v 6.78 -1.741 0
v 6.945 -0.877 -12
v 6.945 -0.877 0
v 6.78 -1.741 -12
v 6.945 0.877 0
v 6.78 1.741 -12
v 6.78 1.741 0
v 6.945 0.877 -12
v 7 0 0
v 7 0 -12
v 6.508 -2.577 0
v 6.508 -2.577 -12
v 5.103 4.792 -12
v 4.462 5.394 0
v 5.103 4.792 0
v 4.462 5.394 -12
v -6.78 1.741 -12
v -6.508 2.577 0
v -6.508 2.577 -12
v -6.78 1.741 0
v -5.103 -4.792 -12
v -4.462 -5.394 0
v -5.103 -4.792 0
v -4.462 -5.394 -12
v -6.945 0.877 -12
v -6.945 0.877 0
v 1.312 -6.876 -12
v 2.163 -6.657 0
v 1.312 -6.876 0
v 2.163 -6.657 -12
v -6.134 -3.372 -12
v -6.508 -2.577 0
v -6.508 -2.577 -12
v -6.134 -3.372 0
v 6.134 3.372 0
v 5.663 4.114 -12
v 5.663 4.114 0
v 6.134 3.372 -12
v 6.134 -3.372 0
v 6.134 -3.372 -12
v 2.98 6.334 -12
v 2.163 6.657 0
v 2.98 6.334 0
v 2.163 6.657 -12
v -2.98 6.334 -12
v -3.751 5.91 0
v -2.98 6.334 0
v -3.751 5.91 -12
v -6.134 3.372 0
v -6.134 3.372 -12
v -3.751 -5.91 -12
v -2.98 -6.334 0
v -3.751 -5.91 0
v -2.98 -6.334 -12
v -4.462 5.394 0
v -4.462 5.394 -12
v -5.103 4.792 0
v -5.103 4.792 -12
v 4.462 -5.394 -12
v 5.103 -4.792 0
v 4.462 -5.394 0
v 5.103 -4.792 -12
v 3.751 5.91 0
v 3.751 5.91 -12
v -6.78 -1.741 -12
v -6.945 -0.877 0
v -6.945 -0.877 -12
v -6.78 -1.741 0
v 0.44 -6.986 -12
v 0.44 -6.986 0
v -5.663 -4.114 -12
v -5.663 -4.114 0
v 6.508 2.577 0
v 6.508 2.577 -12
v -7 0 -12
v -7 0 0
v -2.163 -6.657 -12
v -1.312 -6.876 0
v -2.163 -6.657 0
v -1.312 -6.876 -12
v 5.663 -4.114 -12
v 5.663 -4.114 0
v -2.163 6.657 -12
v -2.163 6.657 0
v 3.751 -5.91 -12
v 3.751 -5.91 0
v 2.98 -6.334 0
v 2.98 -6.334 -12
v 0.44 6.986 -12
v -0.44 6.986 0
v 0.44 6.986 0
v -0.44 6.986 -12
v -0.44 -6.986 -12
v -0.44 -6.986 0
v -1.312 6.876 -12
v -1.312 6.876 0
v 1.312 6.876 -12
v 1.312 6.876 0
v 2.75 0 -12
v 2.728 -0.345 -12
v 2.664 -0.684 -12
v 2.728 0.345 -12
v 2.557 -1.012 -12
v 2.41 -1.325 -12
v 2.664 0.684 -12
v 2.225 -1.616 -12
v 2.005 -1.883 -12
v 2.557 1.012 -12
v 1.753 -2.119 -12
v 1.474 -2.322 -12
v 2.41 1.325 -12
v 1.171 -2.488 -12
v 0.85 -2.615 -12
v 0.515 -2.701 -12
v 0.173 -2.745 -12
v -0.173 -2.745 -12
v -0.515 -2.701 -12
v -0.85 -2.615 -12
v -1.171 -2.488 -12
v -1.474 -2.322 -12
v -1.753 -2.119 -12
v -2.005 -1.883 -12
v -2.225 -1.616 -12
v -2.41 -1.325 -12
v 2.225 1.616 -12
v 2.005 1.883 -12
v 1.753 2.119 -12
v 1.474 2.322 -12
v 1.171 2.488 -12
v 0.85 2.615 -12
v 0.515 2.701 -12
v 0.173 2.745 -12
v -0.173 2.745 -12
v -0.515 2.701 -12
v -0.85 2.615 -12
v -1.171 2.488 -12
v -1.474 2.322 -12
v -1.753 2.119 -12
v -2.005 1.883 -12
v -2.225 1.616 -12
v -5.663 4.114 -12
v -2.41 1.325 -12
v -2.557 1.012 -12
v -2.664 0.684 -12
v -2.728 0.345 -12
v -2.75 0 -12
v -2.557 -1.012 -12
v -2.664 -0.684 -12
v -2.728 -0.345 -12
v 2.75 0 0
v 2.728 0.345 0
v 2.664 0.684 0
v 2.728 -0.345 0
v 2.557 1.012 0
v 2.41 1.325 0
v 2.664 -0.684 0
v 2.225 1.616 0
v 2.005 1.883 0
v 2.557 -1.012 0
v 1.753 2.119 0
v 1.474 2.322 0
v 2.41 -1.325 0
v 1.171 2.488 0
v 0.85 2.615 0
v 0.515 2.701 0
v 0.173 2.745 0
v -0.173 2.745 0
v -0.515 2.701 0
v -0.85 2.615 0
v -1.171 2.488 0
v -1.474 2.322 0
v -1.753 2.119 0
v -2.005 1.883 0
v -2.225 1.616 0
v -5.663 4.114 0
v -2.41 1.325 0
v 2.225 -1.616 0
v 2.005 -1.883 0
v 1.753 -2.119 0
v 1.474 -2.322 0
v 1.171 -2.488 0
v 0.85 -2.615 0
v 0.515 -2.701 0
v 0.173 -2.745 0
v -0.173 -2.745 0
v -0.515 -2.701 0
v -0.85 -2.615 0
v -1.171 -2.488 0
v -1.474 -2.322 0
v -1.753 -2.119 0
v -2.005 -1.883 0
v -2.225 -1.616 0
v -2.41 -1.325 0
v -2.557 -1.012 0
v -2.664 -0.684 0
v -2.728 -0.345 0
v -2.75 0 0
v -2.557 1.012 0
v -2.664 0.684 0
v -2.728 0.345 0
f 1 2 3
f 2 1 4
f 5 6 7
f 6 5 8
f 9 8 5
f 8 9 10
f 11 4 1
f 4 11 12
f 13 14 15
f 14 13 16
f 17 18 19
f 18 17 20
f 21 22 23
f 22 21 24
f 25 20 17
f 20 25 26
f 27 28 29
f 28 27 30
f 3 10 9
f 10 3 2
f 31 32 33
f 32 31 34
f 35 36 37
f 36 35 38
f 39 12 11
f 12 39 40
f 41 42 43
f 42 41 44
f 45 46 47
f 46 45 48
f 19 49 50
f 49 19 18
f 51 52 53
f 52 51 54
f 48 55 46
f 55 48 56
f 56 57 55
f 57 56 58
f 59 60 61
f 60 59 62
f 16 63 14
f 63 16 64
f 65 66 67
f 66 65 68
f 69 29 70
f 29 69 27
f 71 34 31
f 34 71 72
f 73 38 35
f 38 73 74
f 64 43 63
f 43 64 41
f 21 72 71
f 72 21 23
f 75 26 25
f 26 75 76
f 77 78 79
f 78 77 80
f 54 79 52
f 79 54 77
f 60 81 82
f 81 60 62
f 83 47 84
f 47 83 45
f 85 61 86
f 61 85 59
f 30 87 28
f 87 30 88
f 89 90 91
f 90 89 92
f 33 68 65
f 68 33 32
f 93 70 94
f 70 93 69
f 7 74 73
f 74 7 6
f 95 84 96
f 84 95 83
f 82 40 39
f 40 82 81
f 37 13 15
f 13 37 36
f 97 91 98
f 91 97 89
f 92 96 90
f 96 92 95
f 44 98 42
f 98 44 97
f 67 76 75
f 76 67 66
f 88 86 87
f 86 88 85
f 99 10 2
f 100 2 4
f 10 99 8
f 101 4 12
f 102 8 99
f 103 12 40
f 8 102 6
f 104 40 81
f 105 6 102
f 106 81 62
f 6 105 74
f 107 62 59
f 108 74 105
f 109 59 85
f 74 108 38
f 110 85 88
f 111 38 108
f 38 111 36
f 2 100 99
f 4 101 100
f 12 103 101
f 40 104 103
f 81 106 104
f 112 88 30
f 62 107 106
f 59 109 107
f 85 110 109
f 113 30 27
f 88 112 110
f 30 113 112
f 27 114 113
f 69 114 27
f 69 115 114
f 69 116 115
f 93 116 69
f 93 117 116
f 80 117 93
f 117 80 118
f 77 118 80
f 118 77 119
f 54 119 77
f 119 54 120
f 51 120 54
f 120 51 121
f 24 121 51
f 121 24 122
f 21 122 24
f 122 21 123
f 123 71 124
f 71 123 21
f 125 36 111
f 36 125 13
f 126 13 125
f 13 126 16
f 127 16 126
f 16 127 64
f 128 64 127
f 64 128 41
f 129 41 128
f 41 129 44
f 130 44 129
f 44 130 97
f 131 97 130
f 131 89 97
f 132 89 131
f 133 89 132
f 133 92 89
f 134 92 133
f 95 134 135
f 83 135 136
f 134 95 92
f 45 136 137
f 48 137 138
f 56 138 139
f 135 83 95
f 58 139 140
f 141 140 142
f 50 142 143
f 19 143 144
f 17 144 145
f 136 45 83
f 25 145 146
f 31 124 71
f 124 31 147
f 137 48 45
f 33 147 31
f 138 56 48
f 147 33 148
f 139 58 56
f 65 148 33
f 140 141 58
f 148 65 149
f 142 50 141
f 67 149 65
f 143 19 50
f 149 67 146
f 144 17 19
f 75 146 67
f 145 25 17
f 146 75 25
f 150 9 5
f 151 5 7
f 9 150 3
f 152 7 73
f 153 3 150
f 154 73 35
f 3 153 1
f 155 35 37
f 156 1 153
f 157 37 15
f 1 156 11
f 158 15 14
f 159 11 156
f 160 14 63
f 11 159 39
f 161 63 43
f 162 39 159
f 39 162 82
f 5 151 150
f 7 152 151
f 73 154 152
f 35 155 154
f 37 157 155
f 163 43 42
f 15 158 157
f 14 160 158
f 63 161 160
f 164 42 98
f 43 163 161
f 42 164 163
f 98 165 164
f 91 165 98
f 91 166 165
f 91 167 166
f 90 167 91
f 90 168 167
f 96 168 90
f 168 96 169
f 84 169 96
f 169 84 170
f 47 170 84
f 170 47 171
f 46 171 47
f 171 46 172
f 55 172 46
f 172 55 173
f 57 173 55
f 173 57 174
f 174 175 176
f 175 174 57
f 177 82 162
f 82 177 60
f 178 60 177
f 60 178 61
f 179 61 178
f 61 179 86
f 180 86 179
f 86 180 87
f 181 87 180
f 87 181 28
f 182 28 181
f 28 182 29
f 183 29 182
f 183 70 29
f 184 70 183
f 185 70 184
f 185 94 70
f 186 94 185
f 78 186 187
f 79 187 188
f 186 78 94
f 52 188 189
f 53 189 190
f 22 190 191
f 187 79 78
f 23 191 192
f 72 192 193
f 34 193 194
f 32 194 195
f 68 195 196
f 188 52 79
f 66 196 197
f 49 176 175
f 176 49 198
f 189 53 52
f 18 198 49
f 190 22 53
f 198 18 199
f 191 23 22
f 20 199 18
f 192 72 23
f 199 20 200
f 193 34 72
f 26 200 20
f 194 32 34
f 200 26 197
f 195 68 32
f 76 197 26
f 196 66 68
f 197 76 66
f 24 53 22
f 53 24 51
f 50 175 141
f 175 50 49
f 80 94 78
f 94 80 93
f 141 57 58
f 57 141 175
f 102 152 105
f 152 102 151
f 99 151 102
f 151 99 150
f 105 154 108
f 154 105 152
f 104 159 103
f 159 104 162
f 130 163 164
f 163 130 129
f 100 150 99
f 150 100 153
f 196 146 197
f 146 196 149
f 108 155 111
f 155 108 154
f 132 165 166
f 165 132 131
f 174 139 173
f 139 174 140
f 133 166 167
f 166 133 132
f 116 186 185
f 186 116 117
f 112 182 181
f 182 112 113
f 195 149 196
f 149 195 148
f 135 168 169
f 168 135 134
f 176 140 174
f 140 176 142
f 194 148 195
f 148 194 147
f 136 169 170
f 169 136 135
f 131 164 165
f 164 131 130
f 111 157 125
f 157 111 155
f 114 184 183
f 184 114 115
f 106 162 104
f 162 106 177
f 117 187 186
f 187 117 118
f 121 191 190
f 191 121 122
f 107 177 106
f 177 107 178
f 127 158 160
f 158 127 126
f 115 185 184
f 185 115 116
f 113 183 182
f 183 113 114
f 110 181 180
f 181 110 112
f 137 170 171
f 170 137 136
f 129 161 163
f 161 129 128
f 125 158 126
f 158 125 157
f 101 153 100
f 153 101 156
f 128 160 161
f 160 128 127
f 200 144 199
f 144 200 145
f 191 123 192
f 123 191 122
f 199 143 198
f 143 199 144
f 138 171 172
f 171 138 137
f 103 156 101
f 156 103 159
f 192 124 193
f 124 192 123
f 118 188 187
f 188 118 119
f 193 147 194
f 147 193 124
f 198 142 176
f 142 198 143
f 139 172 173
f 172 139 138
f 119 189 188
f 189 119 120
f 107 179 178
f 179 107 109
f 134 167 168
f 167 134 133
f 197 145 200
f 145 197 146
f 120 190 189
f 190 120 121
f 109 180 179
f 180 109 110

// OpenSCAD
$fn = 50;


difference() {
	union() {
		translate(v = [0, 0, -12.0000000000]) {
			cylinder(h = 12, r = 7.0000000000);
		}
		cylinder(h = 0, r = 17.0000000000);
	}
	union() {
		#translate(v = [0, 0, -12]) {
			cylinder(h = 12, r = 2.7500000000);
		}
	}
}
